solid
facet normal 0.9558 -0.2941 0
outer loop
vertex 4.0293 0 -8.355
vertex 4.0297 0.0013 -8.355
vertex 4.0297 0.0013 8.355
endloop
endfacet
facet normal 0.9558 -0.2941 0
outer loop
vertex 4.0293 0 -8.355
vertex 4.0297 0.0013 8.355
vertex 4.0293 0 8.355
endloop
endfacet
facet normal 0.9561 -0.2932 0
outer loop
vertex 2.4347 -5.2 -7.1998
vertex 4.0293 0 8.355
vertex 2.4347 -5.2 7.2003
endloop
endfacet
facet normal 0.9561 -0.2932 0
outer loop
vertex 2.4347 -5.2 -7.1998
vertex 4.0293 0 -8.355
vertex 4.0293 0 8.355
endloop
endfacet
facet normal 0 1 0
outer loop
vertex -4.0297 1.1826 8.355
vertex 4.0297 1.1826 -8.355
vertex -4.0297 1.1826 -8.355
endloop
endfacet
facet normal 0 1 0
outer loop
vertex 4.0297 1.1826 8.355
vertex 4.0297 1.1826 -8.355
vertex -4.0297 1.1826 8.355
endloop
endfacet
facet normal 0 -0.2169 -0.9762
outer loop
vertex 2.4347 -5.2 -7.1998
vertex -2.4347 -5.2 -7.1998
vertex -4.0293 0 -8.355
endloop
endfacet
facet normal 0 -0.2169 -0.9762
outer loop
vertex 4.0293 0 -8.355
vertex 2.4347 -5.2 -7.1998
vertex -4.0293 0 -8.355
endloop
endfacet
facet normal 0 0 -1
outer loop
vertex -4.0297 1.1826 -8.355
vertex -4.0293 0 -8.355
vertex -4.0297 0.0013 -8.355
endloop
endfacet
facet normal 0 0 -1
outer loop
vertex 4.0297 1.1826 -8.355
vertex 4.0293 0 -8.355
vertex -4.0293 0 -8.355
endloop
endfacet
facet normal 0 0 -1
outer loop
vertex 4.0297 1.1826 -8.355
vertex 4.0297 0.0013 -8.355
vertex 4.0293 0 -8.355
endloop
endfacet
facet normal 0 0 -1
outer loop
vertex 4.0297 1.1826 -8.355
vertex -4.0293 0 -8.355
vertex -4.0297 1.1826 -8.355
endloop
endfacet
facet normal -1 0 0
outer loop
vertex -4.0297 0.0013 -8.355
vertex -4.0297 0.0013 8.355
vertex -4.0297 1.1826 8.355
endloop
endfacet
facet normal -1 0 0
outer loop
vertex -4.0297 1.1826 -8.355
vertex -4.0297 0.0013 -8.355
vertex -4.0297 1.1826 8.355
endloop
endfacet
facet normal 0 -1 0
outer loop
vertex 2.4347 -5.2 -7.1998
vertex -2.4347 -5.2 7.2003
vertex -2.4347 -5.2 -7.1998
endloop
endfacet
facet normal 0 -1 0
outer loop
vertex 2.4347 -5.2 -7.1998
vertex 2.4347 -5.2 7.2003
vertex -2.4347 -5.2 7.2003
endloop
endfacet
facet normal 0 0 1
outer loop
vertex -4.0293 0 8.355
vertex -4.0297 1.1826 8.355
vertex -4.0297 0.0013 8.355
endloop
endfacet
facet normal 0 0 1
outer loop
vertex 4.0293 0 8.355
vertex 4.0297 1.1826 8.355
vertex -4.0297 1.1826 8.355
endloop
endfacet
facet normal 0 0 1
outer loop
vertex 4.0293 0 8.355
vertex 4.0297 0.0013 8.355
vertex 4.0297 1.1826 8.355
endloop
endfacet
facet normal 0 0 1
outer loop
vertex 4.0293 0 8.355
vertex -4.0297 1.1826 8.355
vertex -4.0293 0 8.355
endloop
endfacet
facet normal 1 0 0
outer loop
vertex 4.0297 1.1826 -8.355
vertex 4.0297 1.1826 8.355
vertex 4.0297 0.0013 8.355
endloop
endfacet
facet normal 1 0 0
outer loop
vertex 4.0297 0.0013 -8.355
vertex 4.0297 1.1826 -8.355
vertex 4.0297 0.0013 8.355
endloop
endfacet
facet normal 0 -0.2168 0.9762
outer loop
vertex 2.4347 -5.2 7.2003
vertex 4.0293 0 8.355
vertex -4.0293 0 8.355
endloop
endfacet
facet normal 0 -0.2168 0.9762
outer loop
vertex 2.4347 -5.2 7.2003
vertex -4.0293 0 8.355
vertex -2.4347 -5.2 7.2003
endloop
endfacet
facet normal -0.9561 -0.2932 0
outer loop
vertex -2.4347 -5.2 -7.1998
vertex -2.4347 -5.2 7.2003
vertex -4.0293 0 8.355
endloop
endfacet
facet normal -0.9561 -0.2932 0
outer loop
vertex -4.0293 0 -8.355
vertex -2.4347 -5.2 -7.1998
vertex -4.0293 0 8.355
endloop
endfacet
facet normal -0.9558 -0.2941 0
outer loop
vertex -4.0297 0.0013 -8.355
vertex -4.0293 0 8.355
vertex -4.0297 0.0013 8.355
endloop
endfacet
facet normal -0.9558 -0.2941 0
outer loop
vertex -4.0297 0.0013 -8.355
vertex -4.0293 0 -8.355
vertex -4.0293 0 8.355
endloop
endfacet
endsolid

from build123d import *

# Parameters (mm, degrees)
ESTRUSIONE_ESTRUSIONE1_DEPTH      = 10
ESTRUSIONE_ESTRUSIONE1_DEPTH_BACK = 10
SCHIZZO3_OUTSIDE_W                = 27.366
SCHIZZO3_OUTSIDE_H                = 13.749
TAGLIO_ESTRUSIONE2_DEPTH          = 9.355
TAGLIO_ESTRUSIONE2_DEPTH_BACK     = 9.355


with BuildPart() as part:
    # Schizzo2 → Estrusione-Estrusione1 (new body, two sides)
    with BuildSketch(Plane(origin=(0, 0, 0), x_dir=(0, 0, -1), z_dir=(1, 0, 0))) as estrusione_estrusione1_sk:
        Polygon((-7.200336343, -5.2), (7.199751527, -5.2), (8.355, 0), (8.355, 1.182571265), (-8.355, 1.182571265), (-8.355, 0), align=None)
    extrude(amount=ESTRUSIONE_ESTRUSIONE1_DEPTH)
    extrude(estrusione_estrusione1_sk.sketch, amount=-ESTRUSIONE_ESTRUSIONE1_DEPTH_BACK)

    # Schizzo3 outside → Taglio-Estrusione2 (cut, two sides)
    with BuildSketch(Plane.XY) as taglio_estrusione2_sk:
        with Locations((0, -2.0085)):
            Rectangle(SCHIZZO3_OUTSIDE_W, SCHIZZO3_OUTSIDE_H)
        Polygon((2.434296655, -5.201208291), (-2.434296655, -5.201208291), (-4.029664932, 0.001330674), (-4.029664932, 1.658816204), (4.029664932, 1.658816204), (4.029664932, 0.001330674), align=None, mode=Mode.SUBTRACT)
    extrude(amount=TAGLIO_ESTRUSIONE2_DEPTH, mode=Mode.SUBTRACT)
    extrude(taglio_estrusione2_sk.sketch, amount=-TAGLIO_ESTRUSIONE2_DEPTH_BACK, mode=Mode.SUBTRACT)


solid = part.part
